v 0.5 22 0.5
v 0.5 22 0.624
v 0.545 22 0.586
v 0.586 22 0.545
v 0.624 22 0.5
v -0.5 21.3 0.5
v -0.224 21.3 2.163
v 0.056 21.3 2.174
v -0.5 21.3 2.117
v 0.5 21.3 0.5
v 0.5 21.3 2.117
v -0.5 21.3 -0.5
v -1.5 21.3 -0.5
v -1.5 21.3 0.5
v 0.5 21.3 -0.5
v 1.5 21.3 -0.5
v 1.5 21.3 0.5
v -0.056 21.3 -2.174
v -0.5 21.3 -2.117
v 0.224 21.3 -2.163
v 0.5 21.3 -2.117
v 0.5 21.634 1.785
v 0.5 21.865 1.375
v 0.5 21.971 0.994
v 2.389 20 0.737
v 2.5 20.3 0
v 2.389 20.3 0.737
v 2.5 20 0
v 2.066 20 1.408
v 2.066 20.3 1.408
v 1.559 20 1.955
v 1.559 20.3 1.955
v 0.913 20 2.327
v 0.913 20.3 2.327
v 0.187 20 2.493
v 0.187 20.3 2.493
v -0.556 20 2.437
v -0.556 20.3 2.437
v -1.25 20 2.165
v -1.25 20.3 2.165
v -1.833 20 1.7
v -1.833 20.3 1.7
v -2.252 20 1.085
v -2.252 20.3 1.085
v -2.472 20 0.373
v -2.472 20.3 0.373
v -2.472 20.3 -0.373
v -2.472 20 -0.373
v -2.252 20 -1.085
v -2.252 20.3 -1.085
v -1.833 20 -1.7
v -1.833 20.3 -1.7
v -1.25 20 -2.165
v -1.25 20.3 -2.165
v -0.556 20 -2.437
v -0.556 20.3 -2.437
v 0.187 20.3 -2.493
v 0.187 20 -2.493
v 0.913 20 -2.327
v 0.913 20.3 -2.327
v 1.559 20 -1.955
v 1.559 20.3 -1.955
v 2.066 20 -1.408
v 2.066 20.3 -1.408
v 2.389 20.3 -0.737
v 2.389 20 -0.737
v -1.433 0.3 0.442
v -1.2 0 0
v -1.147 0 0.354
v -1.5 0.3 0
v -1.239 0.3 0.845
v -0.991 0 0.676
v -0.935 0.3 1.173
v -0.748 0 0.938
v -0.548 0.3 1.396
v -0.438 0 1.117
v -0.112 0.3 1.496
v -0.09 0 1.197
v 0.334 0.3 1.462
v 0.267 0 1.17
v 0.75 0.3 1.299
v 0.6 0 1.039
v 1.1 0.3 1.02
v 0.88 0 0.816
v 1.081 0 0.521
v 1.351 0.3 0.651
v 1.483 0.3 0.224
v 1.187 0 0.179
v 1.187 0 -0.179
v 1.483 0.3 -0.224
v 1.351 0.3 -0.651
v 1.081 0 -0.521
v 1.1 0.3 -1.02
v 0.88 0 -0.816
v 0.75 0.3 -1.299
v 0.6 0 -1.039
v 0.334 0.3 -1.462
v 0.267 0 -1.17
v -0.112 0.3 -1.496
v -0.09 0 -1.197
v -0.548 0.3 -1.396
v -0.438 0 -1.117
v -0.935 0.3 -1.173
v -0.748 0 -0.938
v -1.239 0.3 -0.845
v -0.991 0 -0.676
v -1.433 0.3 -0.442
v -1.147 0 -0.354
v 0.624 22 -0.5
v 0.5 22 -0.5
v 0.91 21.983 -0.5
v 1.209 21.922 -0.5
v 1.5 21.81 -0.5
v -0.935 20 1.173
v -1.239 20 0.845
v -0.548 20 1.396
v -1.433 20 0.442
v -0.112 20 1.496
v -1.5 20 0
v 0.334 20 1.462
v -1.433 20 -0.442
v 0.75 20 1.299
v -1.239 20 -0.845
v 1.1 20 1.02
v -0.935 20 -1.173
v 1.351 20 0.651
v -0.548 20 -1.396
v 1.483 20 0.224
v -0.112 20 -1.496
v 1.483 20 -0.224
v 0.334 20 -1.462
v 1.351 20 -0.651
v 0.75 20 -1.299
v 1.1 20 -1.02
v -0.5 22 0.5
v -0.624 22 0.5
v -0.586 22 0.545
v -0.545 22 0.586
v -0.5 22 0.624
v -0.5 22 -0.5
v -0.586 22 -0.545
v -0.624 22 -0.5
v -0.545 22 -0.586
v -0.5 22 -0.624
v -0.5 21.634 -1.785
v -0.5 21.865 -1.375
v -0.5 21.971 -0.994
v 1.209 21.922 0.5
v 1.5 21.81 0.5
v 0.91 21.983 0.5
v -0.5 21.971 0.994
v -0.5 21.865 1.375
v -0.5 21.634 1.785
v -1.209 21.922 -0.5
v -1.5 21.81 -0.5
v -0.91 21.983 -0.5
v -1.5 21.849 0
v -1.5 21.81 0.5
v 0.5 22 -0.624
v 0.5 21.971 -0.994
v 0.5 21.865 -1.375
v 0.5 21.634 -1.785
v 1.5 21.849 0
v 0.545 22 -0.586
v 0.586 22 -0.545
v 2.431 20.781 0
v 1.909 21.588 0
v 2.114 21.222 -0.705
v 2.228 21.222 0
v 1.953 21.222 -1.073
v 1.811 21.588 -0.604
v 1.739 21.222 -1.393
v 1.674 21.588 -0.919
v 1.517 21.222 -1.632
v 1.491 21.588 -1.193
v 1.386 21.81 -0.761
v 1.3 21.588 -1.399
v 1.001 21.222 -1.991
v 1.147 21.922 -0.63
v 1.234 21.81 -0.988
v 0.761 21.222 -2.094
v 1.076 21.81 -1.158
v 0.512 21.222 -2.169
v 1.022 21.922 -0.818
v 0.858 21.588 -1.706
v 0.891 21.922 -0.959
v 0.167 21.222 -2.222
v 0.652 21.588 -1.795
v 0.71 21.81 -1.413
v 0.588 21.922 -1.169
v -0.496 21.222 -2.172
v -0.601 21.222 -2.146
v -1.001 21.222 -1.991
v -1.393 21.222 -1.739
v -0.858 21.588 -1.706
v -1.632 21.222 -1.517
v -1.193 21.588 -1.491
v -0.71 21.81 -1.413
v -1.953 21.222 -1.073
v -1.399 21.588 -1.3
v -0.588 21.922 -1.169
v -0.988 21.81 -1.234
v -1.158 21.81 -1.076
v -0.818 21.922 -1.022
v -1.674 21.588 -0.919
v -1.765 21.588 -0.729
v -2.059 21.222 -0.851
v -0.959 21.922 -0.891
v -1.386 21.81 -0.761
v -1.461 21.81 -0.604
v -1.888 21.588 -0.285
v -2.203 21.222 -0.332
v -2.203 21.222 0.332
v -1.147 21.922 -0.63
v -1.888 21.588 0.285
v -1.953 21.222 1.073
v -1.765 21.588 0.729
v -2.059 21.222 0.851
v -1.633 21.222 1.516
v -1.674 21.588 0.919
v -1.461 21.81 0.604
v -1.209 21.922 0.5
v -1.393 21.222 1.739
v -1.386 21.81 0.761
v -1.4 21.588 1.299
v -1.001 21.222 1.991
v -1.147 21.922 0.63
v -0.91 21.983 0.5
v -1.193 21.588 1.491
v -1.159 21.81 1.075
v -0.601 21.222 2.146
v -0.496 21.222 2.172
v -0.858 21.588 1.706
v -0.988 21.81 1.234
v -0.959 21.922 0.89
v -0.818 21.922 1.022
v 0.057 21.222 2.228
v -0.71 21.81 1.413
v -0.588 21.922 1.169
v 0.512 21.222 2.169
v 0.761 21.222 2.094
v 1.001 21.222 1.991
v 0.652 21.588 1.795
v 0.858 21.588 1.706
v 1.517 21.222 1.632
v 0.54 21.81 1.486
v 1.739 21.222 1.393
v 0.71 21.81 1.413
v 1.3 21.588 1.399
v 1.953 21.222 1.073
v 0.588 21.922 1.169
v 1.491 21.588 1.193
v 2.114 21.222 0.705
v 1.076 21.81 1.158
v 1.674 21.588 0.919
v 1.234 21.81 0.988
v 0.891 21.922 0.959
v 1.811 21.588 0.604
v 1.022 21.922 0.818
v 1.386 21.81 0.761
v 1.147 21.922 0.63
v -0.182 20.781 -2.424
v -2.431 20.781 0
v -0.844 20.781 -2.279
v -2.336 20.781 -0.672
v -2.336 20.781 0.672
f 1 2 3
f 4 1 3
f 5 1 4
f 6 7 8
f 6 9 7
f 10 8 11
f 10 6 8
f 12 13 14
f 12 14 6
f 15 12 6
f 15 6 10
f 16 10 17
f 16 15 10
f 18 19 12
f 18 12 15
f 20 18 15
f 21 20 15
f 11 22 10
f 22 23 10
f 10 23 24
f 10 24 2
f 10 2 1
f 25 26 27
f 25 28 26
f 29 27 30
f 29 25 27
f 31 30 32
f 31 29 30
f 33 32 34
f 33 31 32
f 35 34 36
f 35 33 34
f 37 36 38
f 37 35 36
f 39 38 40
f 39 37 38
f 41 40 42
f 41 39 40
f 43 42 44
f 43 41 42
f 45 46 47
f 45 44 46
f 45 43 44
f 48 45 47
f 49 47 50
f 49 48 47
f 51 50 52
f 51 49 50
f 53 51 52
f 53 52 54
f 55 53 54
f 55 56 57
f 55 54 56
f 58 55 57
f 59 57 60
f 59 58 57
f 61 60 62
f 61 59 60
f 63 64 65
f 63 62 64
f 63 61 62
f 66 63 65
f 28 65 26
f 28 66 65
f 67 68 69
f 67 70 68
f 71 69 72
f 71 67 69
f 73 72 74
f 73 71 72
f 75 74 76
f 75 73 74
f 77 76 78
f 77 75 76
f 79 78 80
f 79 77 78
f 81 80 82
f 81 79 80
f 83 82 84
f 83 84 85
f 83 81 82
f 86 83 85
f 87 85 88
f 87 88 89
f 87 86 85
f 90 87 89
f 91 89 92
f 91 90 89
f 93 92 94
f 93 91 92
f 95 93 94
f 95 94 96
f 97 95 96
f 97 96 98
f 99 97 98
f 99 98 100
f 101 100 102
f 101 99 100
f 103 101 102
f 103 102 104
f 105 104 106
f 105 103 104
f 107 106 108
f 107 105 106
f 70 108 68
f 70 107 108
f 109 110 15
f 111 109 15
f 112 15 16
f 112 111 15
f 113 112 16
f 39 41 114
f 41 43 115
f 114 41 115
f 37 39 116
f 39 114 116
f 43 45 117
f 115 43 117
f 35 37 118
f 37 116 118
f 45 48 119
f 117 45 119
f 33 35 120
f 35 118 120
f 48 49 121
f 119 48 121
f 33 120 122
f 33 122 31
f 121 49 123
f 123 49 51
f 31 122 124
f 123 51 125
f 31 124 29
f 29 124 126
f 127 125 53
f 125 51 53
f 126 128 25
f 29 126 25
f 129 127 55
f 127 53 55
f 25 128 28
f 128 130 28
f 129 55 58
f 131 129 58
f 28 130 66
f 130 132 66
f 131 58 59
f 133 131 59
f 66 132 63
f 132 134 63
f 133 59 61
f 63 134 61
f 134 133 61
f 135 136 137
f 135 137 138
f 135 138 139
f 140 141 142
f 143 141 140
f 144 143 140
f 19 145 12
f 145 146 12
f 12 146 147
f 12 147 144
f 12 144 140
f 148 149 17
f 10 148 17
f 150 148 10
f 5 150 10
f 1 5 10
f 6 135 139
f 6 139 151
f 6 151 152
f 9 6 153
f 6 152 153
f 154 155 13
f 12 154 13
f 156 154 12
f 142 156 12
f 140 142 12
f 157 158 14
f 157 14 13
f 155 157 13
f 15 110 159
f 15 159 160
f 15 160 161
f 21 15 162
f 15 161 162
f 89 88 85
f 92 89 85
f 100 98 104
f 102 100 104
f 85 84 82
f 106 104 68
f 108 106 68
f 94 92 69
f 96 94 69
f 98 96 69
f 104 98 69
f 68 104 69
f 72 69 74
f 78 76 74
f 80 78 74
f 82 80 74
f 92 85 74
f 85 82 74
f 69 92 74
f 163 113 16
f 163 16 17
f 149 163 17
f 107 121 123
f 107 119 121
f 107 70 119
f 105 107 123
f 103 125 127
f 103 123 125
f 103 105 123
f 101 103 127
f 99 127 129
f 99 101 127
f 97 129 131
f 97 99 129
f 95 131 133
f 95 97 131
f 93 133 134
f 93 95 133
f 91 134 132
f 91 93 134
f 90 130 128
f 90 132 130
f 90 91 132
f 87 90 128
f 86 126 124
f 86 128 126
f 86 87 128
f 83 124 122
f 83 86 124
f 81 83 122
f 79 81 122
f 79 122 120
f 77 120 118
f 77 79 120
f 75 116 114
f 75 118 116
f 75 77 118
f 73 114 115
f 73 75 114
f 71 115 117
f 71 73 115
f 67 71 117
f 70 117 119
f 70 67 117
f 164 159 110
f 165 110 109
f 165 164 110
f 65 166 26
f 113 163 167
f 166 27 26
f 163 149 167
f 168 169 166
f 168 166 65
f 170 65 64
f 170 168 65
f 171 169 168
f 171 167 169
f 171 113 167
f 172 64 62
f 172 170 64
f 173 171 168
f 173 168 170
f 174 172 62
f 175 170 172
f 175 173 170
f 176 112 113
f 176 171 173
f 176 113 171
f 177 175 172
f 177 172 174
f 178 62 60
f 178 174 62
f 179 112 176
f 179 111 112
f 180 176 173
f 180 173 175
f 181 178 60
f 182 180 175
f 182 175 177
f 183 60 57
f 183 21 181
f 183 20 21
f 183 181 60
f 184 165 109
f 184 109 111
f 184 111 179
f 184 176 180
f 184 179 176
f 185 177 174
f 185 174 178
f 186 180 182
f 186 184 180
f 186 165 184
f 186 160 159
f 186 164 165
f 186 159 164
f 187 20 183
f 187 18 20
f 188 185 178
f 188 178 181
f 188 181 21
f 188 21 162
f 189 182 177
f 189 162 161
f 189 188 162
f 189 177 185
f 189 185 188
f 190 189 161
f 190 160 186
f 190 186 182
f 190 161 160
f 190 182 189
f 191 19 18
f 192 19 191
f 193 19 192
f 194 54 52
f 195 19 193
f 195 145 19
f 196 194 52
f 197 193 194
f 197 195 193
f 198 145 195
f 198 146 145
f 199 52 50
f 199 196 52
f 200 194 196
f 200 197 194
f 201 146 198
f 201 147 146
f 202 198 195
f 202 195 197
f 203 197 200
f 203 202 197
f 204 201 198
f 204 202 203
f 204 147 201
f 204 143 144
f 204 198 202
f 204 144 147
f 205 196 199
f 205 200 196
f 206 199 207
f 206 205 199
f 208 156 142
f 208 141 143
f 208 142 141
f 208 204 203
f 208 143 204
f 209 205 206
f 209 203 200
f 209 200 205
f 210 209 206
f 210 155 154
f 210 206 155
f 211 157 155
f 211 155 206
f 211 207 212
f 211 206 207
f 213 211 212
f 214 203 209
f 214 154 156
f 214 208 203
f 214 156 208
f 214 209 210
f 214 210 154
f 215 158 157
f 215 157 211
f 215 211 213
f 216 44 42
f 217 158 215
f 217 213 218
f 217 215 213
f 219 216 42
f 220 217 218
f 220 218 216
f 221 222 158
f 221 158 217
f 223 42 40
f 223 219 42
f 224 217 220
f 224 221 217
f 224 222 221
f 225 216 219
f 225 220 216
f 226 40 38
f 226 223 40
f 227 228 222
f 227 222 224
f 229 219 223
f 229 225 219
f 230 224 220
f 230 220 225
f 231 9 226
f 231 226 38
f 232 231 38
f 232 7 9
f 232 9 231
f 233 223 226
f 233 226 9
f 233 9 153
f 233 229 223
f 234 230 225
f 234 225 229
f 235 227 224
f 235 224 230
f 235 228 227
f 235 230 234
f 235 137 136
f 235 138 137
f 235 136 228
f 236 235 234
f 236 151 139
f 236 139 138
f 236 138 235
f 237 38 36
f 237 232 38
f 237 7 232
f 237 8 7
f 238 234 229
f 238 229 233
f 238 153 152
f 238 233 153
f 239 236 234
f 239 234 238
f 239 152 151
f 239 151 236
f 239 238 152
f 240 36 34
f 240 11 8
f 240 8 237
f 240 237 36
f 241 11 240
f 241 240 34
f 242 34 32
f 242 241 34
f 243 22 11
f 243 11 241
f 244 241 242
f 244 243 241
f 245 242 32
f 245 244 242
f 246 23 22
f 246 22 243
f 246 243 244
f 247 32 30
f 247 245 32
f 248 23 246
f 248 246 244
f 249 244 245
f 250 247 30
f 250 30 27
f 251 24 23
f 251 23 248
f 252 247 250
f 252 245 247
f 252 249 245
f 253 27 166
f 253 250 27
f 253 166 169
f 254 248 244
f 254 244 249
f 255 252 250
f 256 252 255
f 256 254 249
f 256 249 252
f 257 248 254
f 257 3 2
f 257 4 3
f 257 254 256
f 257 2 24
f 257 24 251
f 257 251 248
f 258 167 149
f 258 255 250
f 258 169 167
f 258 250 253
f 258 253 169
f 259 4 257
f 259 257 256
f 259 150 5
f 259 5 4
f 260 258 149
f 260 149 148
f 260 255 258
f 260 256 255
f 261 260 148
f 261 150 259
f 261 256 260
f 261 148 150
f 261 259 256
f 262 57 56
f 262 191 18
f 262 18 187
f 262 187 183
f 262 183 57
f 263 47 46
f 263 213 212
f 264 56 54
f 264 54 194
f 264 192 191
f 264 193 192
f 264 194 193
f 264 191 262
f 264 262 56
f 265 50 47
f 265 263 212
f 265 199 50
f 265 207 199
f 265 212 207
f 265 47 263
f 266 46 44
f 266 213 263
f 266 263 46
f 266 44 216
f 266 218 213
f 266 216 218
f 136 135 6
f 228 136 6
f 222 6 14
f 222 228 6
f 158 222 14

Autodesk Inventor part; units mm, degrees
ref_plane "YZ Plane" through (0, 0, 0) normal (1, 0, 0) x (0, 1, 0)
ref_plane "XZ Plane" through (0, 0, 0) normal (0, 1, 0) x (-1, 0, 0)
ref_plane "XY Plane" through (0, 0, 0) normal (0, 0, 1) x (1, 0, 0)
sketch "Sketch1" plane through (0, 0, 0) normal (0, 1, 0) x (-1, 0, 0)
  circle A0 centre (0, 0) radius 1.5
  dimension "d0" = 3
extrude "Extrusion1" add sketch "Sketch1" along normal blind 20
sketch "Sketch2" plane through (0, 20, 0) normal (0, 1, 0) x (1, 0, 0)
  circle A0 centre (0, 0) radius 2.5
  dimension "d3" = 5
extrude "Extrusion2" add sketch "Sketch2" along normal blind 2
fillet "Fillet1" radius 1.7 1 edges at (-2.5, 22, 0)
chamfer "Chamfer1" distance 0.3 angle 45 1 edges at (1.5, 0, 0)
thread "Thread1" size "M3x0.5" class "6g" standard "ANSI Metric M Profile" full length
sketch "Sketch3" plane through (0, 22, 0) normal (0, 1, 0) x (1, 0, 0)
  line L0 (0.5, -2.5) -> (0.5, 2.5)
  line L1 (0.5, 2.5) -> (-0.5, 2.5)
  line L2 (-0.5, 2.5) -> (-0.5, -2.5)
  line L3 (-0.5, -2.5) -> (0.5, -2.5)
  line L4 (0.5, -2.5) -> (-0.5, 2.5) construction
  line L5 (0.5, 2.5) -> (-0.5, -2.5) construction
  line L6 (1.5, -0.5) -> (-1.5, -0.5)
  line L7 (-1.5, -0.5) -> (-1.5, 0.5)
  line L8 (-1.5, 0.5) -> (1.5, 0.5)
  line L9 (1.5, 0.5) -> (1.5, -0.5)
  circle A0 centre (0, 0) radius 2.5 projected
  line L10 (1.5, -0.5) -> (-1.5, 0.5) construction
  line L11 (-1.5, -0.5) -> (1.5, 0.5) construction
  dimension "d12" = 1
  dimension "d13" = 3
  dimension "d14" = 1
extrude "Extrusion3" cut sketch "Sketch3" against normal blind 0.7 contours L3 A0 L0 | A0 L2 L6 L0 | L3 L2 A0 | L6 L2 L8 L0 | L0 L8 L9 L6 | L8 L2 A0 L0 | L6 L7 L8 L2 | A0 L1 L0 | L2 L1 A0
properties part number "M3x10 Screw Nylon" material "Steel"
